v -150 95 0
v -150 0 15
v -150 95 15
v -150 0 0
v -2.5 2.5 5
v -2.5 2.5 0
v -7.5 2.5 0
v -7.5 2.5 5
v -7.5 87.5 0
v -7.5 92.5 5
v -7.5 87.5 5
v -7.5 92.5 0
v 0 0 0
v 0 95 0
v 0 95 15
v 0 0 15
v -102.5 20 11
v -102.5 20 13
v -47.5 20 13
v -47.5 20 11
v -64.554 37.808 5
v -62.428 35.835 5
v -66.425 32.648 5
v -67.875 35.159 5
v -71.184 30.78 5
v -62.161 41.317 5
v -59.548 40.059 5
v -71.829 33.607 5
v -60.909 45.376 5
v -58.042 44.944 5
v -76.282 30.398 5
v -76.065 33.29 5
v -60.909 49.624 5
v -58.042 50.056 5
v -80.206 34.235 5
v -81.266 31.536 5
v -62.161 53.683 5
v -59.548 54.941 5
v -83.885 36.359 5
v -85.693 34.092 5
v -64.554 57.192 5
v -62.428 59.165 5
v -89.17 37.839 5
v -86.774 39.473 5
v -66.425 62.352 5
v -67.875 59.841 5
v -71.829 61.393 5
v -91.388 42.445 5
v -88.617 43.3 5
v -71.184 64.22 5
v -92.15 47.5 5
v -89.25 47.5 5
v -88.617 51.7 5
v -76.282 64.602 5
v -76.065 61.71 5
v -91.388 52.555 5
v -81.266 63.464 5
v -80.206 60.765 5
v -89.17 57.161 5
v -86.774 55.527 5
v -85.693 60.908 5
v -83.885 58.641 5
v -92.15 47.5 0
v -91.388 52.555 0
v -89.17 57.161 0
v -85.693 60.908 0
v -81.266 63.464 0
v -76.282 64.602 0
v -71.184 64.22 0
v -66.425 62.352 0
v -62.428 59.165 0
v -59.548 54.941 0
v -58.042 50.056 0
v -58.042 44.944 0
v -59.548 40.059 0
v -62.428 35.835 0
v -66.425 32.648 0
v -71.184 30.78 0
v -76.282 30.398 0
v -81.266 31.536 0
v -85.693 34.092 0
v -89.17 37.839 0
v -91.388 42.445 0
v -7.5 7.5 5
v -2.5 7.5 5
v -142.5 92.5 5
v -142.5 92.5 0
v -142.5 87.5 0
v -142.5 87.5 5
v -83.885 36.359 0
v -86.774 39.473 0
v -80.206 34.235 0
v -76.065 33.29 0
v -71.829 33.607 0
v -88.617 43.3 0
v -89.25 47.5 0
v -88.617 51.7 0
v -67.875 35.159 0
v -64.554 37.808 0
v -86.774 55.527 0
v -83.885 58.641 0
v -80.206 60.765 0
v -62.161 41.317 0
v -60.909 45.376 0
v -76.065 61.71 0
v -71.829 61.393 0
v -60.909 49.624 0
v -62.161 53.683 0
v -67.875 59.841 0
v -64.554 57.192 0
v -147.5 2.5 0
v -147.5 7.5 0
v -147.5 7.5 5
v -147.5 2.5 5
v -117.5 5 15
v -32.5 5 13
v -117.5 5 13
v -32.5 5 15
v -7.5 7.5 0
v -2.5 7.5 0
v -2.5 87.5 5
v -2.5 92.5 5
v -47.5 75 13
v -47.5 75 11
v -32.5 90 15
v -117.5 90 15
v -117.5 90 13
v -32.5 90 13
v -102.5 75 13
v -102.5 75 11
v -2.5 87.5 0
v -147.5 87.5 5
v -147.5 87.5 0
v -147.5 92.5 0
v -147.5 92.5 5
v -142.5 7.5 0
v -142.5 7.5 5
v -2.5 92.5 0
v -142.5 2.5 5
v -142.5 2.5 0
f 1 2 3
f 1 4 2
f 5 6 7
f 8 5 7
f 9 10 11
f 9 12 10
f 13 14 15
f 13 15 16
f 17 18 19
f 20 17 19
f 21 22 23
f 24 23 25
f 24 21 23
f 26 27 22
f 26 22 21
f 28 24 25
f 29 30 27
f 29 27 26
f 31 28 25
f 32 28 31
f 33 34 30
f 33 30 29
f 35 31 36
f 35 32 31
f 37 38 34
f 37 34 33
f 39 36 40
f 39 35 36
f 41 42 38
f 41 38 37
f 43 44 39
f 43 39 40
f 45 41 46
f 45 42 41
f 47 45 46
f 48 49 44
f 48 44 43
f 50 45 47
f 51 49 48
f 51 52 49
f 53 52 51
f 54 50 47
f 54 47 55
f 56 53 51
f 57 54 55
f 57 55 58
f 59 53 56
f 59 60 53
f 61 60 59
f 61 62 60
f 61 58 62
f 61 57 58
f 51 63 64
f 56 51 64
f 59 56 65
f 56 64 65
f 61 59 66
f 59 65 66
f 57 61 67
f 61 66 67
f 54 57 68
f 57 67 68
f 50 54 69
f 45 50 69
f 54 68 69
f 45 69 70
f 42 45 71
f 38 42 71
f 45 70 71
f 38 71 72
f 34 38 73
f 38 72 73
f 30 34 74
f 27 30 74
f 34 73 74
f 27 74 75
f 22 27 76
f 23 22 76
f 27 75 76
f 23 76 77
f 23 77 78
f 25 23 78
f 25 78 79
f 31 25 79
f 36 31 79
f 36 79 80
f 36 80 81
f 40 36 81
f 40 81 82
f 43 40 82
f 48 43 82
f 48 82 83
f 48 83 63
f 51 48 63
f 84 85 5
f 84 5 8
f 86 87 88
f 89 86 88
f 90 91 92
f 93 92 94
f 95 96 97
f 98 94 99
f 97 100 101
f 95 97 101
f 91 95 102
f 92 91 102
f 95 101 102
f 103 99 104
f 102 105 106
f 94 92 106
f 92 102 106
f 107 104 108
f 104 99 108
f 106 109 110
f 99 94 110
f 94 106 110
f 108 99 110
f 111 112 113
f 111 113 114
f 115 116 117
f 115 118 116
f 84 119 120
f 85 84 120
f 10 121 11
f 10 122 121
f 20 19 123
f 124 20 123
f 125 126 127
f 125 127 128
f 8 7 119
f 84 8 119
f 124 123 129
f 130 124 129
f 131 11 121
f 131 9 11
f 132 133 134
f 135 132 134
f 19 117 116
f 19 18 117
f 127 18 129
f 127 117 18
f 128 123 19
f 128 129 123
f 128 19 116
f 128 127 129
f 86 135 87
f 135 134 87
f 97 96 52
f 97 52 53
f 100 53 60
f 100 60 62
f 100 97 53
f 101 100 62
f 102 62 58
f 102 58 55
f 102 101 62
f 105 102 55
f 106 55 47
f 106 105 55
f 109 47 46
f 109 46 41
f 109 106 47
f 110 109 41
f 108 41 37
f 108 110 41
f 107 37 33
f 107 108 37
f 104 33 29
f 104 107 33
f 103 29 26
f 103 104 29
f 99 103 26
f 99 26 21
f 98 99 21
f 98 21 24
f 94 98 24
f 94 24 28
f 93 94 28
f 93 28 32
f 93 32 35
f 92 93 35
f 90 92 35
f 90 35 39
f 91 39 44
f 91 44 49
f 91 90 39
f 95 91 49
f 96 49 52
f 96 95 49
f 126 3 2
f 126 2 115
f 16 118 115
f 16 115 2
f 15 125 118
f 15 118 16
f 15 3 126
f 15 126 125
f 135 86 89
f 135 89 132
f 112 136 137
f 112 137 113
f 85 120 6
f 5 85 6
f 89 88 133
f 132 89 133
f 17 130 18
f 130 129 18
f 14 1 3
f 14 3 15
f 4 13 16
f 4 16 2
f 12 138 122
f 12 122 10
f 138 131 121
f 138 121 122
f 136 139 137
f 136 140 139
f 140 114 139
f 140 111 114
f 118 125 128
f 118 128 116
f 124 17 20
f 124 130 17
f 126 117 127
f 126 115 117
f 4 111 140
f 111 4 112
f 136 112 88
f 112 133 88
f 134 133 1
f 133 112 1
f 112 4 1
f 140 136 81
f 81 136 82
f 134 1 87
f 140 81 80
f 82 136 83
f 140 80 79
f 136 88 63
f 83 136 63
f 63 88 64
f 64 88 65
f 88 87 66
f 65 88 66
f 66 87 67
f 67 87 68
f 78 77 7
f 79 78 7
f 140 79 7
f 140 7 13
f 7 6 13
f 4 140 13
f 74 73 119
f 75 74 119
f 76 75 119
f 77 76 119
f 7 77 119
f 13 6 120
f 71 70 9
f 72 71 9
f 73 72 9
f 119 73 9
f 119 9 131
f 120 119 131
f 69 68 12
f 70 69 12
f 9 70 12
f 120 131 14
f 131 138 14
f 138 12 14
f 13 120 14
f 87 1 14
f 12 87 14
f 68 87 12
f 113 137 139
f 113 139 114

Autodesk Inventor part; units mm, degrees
ref_plane "YZ Plane" through (0, 0, 0) normal (1, 0, 0) x (0, 1, 0)
ref_plane "XZ Plane" through (0, 0, 0) normal (0, 1, 0) x (-1, 0, 0)
ref_plane "XY Plane" through (0, 0, 0) normal (0, 0, 1) x (1, 0, 0)
sketch "Sketch1" plane through (0, 0, 0) normal (0, 0, 1) x (1, 0, 0)
  line L0 (0, 0) -> (-150, 0)
  line L1 (-150, 0) -> (-150, 95)
  line L2 (-150, 95) -> (0, 95)
  line L3 (0, 95) -> (0, 0)
  dimension "d0" = 150
  dimension "d1" = 95
extrude "Extrusion1" add sketch "Sketch1" along normal blind 15
sketch "Sketch2" plane through (0, 0, 15) normal (0, 0, 1) x (1, 0, 0)
  line L0 (-32.5, 5) -> (-117.5, 5)
  line L1 (-117.5, 5) -> (-117.5, 90)
  line L2 (-117.5, 90) -> (-32.5, 90)
  line L3 (-32.5, 90) -> (-32.5, 5)
  point P0 (0, 0)
  dimension "d4" = 85
  dimension "d5" = 85
extrude "Extrusion2" cut sketch "Sketch2" against normal blind 2
sketch "Sketch3" plane through (0, 0, 13) normal (0, 0, 1) x (1, 0, 0)
  line L0 (-47.5, 75) -> (-102.5, 75)
  line L1 (-102.5, 75) -> (-102.5, 20)
  line L2 (-102.5, 20) -> (-47.5, 20)
  line L3 (-47.5, 20) -> (-47.5, 75)
  point P0 (0, 0)
  point P1 (-47.5, 47.5)
  dimension "d10" = 55
  dimension "d11" = 55
extrude "Extrusion3" cut sketch "Sketch3" against normal blind 2
sketch "Sketch4" plane through (0, 0, 0) normal (0, 0, -1) x (-1, 0, 0)
  circle A0 centre (75, 47.5) radius 14.25
  circle A1 centre (75, 47.5) radius 17.15
  line L0 (2.5, 2.5) -> (7.5, 2.5)
  line L1 (7.5, 2.5) -> (7.5, 7.5)
  line L2 (7.5, 7.5) -> (2.5, 7.5)
  line L3 (2.5, 7.5) -> (2.5, 2.5)
  line L4 (147.5, 2.5) -> (142.5, 2.5)
  line L5 (142.5, 2.5) -> (142.5, 7.5)
  line L6 (142.5, 7.5) -> (147.5, 7.5)
  line L7 (147.5, 7.5) -> (147.5, 2.5)
  line L8 (2.5, 92.5) -> (7.5, 92.5)
  line L9 (7.5, 92.5) -> (7.5, 87.5)
  line L10 (7.5, 87.5) -> (2.5, 87.5)
  line L11 (2.5, 87.5) -> (2.5, 92.5)
  line L12 (147.5, 92.5) -> (142.5, 92.5)
  line L13 (142.5, 92.5) -> (142.5, 87.5)
  line L14 (142.5, 87.5) -> (147.5, 87.5)
  line L15 (147.5, 87.5) -> (147.5, 92.5)
  point P0 (0, 0)
  dimension "d14" = 28.5
  dimension "d15" = 34.3
  dimension "d16" = 5
  dimension "d17" = 5
  dimension "d18" = 5
  dimension "d19" = 5
  dimension "d20" = 5
  dimension "d21" = 5
  dimension "d22" = 5
  dimension "d23" = 5
extrude "Extrusion4" cut sketch "Sketch4" against normal blind 5
properties part number "Shoulder_Both_Marker_V1"
